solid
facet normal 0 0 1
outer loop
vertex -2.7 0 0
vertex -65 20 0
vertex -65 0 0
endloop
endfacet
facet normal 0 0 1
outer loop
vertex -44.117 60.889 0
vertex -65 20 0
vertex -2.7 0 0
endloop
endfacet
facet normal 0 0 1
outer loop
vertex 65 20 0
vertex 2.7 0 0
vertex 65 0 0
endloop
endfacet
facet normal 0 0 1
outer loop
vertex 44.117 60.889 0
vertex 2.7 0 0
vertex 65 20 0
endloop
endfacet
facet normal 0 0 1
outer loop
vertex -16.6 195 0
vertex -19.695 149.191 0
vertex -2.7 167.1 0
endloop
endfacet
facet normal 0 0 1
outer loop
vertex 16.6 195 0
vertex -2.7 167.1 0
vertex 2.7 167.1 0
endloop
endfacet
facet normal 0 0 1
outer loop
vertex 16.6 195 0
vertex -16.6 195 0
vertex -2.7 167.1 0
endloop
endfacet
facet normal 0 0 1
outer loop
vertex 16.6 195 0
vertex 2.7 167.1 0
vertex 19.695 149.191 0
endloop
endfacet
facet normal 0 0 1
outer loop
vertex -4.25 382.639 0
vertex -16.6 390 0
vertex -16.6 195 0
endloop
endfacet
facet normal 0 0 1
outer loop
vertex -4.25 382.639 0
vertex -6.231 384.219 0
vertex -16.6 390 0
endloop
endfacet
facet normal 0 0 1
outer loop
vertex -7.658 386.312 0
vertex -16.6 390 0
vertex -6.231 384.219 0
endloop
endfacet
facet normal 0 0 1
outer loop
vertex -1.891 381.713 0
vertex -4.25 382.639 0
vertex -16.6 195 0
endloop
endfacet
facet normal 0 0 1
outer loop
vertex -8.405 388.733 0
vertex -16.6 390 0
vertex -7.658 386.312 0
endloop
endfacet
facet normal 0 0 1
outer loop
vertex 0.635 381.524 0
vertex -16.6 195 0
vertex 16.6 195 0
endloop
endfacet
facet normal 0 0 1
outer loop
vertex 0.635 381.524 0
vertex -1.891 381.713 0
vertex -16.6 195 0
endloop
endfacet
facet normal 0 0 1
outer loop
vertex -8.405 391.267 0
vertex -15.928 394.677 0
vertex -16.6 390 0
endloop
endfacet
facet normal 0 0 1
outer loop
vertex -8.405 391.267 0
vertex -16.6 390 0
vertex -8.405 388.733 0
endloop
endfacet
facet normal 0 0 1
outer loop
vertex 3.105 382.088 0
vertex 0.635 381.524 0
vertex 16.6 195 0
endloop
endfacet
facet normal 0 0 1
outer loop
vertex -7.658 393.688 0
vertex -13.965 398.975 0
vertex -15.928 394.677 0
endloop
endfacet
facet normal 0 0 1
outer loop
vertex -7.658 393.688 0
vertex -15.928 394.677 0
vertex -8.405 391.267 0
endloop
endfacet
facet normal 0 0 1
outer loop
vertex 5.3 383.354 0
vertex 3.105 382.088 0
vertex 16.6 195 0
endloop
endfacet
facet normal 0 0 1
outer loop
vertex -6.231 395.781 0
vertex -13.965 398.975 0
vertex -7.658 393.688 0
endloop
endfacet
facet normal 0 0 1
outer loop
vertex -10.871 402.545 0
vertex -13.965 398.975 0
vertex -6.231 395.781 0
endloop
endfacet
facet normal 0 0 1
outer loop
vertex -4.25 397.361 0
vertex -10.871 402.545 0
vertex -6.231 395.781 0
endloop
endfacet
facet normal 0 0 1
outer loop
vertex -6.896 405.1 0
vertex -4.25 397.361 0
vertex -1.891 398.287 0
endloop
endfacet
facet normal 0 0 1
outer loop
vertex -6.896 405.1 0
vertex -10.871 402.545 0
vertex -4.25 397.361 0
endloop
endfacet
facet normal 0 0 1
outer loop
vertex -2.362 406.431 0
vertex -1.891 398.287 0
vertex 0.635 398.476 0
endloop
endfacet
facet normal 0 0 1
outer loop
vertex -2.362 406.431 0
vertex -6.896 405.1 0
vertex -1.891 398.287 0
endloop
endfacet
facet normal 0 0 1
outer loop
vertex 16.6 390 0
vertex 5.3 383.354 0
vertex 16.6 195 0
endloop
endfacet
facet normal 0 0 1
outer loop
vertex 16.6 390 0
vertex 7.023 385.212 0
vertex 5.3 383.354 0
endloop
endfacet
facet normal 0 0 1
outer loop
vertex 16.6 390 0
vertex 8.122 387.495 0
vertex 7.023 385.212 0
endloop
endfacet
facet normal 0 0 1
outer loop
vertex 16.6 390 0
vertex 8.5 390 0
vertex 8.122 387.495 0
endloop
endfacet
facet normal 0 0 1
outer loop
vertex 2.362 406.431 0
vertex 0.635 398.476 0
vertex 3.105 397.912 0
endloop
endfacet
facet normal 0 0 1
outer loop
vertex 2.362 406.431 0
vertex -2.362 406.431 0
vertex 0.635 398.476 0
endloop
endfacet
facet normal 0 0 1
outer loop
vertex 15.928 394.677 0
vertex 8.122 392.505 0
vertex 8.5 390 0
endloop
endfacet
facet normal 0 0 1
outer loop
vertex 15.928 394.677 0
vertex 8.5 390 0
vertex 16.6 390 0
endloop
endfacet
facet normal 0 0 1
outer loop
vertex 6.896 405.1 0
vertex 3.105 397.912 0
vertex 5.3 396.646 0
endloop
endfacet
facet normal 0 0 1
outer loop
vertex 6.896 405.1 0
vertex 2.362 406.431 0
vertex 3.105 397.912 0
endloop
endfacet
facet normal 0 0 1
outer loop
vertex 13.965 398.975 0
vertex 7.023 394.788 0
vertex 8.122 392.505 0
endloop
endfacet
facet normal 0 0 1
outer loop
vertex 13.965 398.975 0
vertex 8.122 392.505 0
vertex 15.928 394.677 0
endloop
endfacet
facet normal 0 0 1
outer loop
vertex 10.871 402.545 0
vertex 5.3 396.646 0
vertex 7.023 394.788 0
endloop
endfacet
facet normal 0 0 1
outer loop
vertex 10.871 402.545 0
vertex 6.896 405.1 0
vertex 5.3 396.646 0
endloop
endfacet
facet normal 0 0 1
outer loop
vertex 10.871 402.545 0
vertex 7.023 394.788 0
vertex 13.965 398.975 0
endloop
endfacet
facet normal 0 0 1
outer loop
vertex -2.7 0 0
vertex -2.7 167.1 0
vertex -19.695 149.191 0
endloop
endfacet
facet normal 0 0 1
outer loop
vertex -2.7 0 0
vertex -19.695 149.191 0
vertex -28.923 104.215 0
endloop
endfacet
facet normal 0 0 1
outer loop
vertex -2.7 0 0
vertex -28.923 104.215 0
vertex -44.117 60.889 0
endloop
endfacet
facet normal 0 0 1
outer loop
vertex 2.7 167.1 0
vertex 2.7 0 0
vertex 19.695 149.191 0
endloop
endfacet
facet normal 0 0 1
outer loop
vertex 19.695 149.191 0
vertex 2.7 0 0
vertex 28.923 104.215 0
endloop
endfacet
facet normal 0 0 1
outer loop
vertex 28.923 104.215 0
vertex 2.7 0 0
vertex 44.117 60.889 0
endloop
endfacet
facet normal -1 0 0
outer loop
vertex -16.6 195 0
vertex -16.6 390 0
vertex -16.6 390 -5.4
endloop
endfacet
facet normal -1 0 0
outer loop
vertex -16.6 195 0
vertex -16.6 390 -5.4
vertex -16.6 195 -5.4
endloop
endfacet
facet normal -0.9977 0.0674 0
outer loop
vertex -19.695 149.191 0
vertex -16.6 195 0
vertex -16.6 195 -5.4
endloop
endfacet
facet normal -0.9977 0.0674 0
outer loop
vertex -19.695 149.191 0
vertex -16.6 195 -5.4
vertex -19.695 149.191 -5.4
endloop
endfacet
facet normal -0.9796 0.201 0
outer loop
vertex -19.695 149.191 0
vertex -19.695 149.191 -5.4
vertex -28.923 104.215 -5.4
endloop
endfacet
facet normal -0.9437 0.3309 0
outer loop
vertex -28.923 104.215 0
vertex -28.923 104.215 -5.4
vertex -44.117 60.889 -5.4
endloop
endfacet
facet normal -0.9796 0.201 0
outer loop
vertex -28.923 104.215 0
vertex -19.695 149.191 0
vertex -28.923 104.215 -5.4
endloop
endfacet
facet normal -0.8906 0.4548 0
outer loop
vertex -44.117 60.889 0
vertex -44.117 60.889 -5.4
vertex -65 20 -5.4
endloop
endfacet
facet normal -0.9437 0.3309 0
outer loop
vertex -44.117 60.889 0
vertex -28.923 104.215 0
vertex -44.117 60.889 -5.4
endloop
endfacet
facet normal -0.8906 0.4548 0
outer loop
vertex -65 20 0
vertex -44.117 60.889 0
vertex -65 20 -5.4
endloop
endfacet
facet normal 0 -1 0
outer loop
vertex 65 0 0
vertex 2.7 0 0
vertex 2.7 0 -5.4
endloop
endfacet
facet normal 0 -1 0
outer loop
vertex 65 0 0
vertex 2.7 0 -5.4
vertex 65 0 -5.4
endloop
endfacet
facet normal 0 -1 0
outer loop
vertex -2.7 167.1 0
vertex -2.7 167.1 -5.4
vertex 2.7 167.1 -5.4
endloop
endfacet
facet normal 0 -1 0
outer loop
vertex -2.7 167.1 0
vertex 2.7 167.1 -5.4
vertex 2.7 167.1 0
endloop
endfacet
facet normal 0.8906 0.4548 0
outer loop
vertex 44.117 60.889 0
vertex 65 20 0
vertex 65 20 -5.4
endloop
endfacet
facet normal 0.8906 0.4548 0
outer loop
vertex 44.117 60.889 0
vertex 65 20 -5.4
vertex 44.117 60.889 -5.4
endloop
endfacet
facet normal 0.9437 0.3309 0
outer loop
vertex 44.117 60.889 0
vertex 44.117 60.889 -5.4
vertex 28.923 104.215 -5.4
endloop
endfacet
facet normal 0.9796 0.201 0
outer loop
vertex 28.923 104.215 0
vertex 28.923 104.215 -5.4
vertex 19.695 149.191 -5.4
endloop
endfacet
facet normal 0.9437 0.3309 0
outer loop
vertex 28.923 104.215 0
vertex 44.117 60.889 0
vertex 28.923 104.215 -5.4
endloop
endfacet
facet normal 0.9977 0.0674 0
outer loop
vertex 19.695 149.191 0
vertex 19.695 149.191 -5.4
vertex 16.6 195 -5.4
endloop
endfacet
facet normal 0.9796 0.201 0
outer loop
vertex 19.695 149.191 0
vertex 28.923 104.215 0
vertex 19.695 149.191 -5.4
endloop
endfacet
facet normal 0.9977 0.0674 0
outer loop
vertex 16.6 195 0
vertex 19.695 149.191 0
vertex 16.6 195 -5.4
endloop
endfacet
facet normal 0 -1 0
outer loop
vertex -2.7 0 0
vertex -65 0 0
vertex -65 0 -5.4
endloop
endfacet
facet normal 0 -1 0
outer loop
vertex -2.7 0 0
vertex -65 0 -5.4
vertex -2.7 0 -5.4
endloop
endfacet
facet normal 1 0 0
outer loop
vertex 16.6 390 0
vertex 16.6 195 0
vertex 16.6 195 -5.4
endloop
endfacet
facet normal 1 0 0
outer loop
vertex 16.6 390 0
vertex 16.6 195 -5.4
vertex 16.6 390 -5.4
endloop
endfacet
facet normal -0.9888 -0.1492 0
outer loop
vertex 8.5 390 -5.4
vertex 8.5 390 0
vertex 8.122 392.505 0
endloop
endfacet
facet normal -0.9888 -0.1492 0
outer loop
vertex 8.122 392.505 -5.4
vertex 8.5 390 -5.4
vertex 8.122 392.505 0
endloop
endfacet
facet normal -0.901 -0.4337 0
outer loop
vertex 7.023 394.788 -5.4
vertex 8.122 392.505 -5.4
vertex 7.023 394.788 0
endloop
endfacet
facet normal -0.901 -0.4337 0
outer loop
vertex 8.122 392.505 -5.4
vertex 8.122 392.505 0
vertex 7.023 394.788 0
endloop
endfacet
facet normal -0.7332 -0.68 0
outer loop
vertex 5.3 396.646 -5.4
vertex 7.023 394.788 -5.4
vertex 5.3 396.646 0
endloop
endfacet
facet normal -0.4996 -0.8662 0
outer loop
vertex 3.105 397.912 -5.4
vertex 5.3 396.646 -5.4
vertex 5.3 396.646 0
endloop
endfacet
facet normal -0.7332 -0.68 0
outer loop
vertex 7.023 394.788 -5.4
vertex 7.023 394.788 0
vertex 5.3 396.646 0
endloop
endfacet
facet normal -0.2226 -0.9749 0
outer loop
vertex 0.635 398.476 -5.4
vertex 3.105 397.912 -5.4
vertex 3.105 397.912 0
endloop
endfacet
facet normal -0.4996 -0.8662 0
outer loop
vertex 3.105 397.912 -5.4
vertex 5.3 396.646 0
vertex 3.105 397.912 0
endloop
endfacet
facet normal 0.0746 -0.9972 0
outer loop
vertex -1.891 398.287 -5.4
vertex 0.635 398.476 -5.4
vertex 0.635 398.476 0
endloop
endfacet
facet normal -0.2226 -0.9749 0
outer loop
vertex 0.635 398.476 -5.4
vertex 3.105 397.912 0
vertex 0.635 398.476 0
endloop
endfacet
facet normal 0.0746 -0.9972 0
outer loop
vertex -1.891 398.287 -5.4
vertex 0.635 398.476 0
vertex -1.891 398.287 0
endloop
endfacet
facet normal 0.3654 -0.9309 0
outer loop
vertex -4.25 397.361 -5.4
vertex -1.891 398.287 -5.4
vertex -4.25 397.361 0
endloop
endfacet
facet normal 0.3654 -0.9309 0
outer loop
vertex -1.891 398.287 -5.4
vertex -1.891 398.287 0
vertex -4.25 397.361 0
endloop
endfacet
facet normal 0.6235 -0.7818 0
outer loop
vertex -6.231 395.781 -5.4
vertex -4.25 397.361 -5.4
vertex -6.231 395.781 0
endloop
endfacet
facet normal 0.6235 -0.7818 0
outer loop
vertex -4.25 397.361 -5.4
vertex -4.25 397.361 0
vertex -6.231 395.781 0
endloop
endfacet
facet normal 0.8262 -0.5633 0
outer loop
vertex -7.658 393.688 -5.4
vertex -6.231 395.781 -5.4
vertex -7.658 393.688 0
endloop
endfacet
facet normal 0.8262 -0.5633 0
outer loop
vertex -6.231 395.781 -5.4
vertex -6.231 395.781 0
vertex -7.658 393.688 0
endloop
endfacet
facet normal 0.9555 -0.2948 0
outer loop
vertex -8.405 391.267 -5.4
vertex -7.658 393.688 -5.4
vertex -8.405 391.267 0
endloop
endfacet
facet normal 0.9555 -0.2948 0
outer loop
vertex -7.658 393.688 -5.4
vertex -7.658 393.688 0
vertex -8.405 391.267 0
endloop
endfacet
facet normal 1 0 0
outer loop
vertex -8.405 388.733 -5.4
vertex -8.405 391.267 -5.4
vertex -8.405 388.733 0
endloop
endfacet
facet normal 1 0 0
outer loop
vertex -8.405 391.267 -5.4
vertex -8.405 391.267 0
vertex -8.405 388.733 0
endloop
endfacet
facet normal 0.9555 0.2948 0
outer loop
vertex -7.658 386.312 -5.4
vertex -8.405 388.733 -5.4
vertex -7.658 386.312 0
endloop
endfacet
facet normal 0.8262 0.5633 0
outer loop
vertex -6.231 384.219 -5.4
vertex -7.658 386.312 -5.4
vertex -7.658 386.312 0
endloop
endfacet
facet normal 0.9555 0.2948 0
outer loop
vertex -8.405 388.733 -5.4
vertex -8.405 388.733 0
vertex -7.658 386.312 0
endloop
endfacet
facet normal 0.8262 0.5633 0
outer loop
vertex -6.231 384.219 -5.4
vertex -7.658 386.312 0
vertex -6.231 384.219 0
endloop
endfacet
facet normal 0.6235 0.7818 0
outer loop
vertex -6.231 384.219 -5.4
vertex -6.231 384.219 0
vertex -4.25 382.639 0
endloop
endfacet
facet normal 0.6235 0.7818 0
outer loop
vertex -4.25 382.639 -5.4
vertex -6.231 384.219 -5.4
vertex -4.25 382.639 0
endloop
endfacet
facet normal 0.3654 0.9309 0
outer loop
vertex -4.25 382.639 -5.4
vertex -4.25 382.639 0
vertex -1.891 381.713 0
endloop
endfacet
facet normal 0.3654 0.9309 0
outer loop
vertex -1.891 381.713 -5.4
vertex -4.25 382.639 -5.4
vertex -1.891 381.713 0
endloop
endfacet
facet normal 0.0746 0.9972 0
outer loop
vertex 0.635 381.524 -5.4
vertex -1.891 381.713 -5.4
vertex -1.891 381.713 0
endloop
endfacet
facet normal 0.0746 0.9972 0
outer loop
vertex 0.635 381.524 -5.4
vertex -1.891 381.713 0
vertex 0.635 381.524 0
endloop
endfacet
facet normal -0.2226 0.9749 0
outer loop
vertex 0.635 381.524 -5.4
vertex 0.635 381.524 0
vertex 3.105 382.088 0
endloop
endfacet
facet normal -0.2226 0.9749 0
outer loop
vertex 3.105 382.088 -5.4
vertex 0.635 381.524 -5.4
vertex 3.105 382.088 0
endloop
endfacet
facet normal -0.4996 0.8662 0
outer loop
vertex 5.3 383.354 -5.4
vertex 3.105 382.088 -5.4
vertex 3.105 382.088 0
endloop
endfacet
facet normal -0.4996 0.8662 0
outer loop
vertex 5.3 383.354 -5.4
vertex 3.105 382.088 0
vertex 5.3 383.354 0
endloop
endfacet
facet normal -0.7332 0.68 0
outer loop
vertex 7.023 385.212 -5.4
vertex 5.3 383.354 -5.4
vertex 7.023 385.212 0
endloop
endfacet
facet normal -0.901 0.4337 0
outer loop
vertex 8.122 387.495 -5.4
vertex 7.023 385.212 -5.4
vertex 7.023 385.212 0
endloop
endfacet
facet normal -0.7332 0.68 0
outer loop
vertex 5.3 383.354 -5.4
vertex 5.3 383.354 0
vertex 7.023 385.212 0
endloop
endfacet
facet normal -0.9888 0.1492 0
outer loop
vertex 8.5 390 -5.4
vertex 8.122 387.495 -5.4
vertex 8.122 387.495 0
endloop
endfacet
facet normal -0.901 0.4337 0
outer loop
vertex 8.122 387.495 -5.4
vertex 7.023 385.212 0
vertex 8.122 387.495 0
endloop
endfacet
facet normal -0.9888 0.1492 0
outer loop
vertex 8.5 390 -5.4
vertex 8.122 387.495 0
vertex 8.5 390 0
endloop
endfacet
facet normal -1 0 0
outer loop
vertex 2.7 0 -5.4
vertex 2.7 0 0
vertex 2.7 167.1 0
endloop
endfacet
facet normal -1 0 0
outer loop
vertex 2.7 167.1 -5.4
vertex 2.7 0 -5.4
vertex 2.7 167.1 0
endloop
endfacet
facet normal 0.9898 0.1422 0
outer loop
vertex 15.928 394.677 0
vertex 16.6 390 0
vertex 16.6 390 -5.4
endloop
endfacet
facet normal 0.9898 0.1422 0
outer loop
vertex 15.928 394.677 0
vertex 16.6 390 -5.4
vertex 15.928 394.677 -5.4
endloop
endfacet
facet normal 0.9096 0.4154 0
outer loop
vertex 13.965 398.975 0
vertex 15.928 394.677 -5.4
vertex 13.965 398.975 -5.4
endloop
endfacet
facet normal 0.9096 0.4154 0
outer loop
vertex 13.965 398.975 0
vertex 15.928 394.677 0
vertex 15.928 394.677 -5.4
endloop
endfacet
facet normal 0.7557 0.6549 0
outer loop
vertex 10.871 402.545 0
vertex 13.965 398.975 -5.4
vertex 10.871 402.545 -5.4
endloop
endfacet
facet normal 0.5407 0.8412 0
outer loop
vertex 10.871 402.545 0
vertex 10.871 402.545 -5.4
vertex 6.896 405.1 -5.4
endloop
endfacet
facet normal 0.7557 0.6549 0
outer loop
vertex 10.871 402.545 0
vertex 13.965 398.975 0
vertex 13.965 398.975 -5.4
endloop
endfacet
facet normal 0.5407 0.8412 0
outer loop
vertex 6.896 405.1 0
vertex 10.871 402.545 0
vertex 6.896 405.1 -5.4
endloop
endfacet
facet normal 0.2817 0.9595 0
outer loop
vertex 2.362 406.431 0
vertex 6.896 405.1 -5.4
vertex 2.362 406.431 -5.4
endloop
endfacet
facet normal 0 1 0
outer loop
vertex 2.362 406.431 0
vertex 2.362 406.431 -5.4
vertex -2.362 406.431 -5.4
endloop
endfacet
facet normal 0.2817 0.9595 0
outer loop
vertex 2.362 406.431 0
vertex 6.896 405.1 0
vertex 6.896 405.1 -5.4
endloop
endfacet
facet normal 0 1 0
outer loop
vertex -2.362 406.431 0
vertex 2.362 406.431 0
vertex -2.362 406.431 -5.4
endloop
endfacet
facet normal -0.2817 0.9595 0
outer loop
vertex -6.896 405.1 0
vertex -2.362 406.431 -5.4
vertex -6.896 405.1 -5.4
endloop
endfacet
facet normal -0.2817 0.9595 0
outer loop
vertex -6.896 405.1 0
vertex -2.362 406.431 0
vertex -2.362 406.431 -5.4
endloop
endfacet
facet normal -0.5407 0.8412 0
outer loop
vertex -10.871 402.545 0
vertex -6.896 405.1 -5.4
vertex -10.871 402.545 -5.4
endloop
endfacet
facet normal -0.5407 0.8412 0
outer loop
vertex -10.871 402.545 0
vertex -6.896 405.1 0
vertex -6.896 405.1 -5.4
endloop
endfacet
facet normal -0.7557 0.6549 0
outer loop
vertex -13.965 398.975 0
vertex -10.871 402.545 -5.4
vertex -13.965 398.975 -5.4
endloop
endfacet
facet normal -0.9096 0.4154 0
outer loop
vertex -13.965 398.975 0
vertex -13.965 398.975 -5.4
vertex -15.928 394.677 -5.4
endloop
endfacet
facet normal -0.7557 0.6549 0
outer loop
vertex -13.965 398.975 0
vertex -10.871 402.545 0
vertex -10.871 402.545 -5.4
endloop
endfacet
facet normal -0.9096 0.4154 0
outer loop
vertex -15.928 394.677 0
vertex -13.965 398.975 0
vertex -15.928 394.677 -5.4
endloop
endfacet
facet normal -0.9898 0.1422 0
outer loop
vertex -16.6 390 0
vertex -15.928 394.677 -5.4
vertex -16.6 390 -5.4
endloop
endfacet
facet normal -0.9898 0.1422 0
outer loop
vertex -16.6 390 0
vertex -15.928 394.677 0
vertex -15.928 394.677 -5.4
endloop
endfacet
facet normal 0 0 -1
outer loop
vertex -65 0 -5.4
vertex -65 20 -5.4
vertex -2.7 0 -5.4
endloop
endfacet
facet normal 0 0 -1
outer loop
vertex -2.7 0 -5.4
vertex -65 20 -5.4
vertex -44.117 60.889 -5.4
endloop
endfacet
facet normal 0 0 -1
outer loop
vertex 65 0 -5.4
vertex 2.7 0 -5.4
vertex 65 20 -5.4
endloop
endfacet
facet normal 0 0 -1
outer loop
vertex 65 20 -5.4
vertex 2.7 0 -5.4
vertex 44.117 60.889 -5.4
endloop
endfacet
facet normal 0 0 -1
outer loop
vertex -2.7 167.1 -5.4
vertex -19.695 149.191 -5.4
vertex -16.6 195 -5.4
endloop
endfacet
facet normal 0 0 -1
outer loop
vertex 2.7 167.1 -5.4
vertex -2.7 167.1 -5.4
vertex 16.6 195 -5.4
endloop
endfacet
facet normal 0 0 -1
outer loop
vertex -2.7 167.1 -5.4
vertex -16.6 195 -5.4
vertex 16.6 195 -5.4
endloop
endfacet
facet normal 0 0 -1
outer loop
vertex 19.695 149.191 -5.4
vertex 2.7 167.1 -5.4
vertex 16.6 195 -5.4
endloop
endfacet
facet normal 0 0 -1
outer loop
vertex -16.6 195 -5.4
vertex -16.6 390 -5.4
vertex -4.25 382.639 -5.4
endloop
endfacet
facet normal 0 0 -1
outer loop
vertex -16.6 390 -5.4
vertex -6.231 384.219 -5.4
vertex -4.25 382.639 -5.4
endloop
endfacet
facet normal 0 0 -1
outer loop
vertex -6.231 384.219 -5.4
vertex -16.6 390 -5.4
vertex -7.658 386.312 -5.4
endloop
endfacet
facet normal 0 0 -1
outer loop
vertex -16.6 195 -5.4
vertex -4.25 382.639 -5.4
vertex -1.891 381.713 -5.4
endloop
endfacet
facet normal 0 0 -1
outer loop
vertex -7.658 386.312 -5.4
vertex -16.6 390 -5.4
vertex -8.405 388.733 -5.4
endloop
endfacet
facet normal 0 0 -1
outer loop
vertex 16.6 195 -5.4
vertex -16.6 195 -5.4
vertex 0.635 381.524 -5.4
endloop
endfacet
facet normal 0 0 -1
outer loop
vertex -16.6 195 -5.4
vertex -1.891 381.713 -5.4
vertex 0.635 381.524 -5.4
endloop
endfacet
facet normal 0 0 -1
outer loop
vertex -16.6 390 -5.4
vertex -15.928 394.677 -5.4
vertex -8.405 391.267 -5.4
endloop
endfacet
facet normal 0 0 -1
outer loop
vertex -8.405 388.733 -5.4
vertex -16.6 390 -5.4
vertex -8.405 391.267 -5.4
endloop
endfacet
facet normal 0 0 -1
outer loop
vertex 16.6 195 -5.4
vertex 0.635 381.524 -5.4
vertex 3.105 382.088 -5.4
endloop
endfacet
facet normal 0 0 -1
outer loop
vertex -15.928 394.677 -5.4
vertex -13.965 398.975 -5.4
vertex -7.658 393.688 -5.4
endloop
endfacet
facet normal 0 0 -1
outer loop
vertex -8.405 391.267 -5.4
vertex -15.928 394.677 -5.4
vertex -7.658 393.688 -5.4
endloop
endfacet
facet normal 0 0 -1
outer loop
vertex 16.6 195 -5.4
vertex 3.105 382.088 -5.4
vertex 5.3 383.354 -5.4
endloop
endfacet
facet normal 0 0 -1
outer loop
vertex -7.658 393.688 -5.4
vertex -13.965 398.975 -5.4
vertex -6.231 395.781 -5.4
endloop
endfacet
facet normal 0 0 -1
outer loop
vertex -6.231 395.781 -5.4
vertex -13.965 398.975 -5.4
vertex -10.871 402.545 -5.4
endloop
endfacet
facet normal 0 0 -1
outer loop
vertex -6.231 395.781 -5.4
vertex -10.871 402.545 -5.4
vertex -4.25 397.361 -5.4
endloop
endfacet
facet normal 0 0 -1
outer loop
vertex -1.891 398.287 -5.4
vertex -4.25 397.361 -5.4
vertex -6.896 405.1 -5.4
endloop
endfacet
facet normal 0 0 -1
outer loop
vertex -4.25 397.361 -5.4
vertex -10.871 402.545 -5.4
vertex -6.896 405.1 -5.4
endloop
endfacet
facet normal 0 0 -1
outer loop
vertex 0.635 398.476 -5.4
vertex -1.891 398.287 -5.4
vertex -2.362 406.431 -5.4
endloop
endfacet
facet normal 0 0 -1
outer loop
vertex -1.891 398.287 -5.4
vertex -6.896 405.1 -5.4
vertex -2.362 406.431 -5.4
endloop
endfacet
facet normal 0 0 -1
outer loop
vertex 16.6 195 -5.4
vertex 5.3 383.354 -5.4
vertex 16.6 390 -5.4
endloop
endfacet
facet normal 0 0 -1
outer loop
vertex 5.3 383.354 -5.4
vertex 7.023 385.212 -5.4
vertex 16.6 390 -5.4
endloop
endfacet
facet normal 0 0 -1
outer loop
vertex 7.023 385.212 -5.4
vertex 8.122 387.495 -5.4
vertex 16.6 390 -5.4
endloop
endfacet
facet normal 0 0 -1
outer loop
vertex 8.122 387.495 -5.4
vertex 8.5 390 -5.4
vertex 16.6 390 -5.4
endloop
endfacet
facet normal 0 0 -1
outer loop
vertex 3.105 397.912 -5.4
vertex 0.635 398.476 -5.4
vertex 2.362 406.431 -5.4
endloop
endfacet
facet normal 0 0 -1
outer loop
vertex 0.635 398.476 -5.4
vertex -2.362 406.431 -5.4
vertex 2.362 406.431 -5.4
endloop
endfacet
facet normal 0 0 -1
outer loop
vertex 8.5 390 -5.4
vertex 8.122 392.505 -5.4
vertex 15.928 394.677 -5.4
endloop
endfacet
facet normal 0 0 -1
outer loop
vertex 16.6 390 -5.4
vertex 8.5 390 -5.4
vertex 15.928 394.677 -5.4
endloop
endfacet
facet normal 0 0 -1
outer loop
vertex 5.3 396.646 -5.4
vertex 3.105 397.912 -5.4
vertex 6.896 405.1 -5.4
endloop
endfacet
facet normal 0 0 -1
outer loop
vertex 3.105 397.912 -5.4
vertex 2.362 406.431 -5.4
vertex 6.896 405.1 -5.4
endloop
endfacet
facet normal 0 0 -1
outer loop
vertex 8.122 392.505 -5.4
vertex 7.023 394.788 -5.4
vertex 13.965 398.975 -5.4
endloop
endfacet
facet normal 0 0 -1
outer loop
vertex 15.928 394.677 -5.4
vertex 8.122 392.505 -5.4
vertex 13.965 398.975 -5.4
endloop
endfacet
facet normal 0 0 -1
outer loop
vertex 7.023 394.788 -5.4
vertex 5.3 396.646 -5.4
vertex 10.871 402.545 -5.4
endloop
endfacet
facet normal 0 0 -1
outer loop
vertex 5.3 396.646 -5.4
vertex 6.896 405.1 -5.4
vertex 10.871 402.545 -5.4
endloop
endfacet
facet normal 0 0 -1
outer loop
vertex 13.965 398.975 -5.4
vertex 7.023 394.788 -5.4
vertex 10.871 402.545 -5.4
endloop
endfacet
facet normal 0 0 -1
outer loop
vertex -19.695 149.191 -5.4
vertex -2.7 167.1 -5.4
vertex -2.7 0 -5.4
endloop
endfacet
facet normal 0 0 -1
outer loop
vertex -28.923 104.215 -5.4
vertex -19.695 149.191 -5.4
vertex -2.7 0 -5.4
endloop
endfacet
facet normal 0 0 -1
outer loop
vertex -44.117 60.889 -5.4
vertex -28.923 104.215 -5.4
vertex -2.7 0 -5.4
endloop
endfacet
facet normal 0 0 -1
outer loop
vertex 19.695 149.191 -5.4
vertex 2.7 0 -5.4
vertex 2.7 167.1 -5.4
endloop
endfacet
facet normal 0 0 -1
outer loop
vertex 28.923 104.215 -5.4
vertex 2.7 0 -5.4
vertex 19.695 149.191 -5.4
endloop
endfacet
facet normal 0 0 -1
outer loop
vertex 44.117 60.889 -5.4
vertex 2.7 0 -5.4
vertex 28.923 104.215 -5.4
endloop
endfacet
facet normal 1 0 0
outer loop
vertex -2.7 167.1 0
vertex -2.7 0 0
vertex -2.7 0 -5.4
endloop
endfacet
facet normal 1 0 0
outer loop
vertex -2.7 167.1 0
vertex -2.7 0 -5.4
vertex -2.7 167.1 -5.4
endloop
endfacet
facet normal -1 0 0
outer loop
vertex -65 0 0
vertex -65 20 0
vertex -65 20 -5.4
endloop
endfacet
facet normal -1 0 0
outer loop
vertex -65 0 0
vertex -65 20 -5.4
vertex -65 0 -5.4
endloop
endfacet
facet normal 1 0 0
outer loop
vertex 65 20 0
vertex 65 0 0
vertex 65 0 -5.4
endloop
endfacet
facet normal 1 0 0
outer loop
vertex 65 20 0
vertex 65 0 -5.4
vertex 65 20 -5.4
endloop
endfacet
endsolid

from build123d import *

# Parameters (mm, degrees)
SKETCH2_R           = 8.5
BOSS_EXTRUDE1_DEPTH = 5.4
CAVITY1_START       = -2.7
CAVITY1_OUTLINE_W   = 167.1
CAVITY1_OUTLINE_H   = 5.4
CAVITY1_DEPTH       = 5.4


# Read off the part's stored shape, not the designer's step: Cavity1
with BuildPart() as part:
    # Sketch2 → Boss-Extrude1 (new body)
    with BuildSketch(Plane.XY):
        with BuildLine():
            Line((-65, 0), (65, 0))
            Line((65, 0), (65, 20))
            ThreePointArc((65, 20), (28.922939589, 104.215144435), (16.6, 195))
            Line((16.6, 195), (16.6, 390))
            ThreePointArc((16.6, 390), (0, 406.6), (-16.6, 390))
            Line((-16.6, 390), (-16.6, 195))
            ThreePointArc((-16.6, 195), (-28.922939589, 104.215144435), (-65, 20))
            Line((-65, 20), (-65, 0))
        make_face()
        with Locations((0, 390)):
            Circle(SKETCH2_R, mode=Mode.SUBTRACT)
    extrude(amount=-BOSS_EXTRUDE1_DEPTH)

    # Cavity1 outline → Cavity1 (cut)
    with BuildSketch(Plane.YZ.offset(CAVITY1_START)):
        with Locations((83.55, -2.7)):
            Rectangle(CAVITY1_OUTLINE_W, CAVITY1_OUTLINE_H)
    extrude(amount=CAVITY1_DEPTH, mode=Mode.SUBTRACT)


solid = part.part
